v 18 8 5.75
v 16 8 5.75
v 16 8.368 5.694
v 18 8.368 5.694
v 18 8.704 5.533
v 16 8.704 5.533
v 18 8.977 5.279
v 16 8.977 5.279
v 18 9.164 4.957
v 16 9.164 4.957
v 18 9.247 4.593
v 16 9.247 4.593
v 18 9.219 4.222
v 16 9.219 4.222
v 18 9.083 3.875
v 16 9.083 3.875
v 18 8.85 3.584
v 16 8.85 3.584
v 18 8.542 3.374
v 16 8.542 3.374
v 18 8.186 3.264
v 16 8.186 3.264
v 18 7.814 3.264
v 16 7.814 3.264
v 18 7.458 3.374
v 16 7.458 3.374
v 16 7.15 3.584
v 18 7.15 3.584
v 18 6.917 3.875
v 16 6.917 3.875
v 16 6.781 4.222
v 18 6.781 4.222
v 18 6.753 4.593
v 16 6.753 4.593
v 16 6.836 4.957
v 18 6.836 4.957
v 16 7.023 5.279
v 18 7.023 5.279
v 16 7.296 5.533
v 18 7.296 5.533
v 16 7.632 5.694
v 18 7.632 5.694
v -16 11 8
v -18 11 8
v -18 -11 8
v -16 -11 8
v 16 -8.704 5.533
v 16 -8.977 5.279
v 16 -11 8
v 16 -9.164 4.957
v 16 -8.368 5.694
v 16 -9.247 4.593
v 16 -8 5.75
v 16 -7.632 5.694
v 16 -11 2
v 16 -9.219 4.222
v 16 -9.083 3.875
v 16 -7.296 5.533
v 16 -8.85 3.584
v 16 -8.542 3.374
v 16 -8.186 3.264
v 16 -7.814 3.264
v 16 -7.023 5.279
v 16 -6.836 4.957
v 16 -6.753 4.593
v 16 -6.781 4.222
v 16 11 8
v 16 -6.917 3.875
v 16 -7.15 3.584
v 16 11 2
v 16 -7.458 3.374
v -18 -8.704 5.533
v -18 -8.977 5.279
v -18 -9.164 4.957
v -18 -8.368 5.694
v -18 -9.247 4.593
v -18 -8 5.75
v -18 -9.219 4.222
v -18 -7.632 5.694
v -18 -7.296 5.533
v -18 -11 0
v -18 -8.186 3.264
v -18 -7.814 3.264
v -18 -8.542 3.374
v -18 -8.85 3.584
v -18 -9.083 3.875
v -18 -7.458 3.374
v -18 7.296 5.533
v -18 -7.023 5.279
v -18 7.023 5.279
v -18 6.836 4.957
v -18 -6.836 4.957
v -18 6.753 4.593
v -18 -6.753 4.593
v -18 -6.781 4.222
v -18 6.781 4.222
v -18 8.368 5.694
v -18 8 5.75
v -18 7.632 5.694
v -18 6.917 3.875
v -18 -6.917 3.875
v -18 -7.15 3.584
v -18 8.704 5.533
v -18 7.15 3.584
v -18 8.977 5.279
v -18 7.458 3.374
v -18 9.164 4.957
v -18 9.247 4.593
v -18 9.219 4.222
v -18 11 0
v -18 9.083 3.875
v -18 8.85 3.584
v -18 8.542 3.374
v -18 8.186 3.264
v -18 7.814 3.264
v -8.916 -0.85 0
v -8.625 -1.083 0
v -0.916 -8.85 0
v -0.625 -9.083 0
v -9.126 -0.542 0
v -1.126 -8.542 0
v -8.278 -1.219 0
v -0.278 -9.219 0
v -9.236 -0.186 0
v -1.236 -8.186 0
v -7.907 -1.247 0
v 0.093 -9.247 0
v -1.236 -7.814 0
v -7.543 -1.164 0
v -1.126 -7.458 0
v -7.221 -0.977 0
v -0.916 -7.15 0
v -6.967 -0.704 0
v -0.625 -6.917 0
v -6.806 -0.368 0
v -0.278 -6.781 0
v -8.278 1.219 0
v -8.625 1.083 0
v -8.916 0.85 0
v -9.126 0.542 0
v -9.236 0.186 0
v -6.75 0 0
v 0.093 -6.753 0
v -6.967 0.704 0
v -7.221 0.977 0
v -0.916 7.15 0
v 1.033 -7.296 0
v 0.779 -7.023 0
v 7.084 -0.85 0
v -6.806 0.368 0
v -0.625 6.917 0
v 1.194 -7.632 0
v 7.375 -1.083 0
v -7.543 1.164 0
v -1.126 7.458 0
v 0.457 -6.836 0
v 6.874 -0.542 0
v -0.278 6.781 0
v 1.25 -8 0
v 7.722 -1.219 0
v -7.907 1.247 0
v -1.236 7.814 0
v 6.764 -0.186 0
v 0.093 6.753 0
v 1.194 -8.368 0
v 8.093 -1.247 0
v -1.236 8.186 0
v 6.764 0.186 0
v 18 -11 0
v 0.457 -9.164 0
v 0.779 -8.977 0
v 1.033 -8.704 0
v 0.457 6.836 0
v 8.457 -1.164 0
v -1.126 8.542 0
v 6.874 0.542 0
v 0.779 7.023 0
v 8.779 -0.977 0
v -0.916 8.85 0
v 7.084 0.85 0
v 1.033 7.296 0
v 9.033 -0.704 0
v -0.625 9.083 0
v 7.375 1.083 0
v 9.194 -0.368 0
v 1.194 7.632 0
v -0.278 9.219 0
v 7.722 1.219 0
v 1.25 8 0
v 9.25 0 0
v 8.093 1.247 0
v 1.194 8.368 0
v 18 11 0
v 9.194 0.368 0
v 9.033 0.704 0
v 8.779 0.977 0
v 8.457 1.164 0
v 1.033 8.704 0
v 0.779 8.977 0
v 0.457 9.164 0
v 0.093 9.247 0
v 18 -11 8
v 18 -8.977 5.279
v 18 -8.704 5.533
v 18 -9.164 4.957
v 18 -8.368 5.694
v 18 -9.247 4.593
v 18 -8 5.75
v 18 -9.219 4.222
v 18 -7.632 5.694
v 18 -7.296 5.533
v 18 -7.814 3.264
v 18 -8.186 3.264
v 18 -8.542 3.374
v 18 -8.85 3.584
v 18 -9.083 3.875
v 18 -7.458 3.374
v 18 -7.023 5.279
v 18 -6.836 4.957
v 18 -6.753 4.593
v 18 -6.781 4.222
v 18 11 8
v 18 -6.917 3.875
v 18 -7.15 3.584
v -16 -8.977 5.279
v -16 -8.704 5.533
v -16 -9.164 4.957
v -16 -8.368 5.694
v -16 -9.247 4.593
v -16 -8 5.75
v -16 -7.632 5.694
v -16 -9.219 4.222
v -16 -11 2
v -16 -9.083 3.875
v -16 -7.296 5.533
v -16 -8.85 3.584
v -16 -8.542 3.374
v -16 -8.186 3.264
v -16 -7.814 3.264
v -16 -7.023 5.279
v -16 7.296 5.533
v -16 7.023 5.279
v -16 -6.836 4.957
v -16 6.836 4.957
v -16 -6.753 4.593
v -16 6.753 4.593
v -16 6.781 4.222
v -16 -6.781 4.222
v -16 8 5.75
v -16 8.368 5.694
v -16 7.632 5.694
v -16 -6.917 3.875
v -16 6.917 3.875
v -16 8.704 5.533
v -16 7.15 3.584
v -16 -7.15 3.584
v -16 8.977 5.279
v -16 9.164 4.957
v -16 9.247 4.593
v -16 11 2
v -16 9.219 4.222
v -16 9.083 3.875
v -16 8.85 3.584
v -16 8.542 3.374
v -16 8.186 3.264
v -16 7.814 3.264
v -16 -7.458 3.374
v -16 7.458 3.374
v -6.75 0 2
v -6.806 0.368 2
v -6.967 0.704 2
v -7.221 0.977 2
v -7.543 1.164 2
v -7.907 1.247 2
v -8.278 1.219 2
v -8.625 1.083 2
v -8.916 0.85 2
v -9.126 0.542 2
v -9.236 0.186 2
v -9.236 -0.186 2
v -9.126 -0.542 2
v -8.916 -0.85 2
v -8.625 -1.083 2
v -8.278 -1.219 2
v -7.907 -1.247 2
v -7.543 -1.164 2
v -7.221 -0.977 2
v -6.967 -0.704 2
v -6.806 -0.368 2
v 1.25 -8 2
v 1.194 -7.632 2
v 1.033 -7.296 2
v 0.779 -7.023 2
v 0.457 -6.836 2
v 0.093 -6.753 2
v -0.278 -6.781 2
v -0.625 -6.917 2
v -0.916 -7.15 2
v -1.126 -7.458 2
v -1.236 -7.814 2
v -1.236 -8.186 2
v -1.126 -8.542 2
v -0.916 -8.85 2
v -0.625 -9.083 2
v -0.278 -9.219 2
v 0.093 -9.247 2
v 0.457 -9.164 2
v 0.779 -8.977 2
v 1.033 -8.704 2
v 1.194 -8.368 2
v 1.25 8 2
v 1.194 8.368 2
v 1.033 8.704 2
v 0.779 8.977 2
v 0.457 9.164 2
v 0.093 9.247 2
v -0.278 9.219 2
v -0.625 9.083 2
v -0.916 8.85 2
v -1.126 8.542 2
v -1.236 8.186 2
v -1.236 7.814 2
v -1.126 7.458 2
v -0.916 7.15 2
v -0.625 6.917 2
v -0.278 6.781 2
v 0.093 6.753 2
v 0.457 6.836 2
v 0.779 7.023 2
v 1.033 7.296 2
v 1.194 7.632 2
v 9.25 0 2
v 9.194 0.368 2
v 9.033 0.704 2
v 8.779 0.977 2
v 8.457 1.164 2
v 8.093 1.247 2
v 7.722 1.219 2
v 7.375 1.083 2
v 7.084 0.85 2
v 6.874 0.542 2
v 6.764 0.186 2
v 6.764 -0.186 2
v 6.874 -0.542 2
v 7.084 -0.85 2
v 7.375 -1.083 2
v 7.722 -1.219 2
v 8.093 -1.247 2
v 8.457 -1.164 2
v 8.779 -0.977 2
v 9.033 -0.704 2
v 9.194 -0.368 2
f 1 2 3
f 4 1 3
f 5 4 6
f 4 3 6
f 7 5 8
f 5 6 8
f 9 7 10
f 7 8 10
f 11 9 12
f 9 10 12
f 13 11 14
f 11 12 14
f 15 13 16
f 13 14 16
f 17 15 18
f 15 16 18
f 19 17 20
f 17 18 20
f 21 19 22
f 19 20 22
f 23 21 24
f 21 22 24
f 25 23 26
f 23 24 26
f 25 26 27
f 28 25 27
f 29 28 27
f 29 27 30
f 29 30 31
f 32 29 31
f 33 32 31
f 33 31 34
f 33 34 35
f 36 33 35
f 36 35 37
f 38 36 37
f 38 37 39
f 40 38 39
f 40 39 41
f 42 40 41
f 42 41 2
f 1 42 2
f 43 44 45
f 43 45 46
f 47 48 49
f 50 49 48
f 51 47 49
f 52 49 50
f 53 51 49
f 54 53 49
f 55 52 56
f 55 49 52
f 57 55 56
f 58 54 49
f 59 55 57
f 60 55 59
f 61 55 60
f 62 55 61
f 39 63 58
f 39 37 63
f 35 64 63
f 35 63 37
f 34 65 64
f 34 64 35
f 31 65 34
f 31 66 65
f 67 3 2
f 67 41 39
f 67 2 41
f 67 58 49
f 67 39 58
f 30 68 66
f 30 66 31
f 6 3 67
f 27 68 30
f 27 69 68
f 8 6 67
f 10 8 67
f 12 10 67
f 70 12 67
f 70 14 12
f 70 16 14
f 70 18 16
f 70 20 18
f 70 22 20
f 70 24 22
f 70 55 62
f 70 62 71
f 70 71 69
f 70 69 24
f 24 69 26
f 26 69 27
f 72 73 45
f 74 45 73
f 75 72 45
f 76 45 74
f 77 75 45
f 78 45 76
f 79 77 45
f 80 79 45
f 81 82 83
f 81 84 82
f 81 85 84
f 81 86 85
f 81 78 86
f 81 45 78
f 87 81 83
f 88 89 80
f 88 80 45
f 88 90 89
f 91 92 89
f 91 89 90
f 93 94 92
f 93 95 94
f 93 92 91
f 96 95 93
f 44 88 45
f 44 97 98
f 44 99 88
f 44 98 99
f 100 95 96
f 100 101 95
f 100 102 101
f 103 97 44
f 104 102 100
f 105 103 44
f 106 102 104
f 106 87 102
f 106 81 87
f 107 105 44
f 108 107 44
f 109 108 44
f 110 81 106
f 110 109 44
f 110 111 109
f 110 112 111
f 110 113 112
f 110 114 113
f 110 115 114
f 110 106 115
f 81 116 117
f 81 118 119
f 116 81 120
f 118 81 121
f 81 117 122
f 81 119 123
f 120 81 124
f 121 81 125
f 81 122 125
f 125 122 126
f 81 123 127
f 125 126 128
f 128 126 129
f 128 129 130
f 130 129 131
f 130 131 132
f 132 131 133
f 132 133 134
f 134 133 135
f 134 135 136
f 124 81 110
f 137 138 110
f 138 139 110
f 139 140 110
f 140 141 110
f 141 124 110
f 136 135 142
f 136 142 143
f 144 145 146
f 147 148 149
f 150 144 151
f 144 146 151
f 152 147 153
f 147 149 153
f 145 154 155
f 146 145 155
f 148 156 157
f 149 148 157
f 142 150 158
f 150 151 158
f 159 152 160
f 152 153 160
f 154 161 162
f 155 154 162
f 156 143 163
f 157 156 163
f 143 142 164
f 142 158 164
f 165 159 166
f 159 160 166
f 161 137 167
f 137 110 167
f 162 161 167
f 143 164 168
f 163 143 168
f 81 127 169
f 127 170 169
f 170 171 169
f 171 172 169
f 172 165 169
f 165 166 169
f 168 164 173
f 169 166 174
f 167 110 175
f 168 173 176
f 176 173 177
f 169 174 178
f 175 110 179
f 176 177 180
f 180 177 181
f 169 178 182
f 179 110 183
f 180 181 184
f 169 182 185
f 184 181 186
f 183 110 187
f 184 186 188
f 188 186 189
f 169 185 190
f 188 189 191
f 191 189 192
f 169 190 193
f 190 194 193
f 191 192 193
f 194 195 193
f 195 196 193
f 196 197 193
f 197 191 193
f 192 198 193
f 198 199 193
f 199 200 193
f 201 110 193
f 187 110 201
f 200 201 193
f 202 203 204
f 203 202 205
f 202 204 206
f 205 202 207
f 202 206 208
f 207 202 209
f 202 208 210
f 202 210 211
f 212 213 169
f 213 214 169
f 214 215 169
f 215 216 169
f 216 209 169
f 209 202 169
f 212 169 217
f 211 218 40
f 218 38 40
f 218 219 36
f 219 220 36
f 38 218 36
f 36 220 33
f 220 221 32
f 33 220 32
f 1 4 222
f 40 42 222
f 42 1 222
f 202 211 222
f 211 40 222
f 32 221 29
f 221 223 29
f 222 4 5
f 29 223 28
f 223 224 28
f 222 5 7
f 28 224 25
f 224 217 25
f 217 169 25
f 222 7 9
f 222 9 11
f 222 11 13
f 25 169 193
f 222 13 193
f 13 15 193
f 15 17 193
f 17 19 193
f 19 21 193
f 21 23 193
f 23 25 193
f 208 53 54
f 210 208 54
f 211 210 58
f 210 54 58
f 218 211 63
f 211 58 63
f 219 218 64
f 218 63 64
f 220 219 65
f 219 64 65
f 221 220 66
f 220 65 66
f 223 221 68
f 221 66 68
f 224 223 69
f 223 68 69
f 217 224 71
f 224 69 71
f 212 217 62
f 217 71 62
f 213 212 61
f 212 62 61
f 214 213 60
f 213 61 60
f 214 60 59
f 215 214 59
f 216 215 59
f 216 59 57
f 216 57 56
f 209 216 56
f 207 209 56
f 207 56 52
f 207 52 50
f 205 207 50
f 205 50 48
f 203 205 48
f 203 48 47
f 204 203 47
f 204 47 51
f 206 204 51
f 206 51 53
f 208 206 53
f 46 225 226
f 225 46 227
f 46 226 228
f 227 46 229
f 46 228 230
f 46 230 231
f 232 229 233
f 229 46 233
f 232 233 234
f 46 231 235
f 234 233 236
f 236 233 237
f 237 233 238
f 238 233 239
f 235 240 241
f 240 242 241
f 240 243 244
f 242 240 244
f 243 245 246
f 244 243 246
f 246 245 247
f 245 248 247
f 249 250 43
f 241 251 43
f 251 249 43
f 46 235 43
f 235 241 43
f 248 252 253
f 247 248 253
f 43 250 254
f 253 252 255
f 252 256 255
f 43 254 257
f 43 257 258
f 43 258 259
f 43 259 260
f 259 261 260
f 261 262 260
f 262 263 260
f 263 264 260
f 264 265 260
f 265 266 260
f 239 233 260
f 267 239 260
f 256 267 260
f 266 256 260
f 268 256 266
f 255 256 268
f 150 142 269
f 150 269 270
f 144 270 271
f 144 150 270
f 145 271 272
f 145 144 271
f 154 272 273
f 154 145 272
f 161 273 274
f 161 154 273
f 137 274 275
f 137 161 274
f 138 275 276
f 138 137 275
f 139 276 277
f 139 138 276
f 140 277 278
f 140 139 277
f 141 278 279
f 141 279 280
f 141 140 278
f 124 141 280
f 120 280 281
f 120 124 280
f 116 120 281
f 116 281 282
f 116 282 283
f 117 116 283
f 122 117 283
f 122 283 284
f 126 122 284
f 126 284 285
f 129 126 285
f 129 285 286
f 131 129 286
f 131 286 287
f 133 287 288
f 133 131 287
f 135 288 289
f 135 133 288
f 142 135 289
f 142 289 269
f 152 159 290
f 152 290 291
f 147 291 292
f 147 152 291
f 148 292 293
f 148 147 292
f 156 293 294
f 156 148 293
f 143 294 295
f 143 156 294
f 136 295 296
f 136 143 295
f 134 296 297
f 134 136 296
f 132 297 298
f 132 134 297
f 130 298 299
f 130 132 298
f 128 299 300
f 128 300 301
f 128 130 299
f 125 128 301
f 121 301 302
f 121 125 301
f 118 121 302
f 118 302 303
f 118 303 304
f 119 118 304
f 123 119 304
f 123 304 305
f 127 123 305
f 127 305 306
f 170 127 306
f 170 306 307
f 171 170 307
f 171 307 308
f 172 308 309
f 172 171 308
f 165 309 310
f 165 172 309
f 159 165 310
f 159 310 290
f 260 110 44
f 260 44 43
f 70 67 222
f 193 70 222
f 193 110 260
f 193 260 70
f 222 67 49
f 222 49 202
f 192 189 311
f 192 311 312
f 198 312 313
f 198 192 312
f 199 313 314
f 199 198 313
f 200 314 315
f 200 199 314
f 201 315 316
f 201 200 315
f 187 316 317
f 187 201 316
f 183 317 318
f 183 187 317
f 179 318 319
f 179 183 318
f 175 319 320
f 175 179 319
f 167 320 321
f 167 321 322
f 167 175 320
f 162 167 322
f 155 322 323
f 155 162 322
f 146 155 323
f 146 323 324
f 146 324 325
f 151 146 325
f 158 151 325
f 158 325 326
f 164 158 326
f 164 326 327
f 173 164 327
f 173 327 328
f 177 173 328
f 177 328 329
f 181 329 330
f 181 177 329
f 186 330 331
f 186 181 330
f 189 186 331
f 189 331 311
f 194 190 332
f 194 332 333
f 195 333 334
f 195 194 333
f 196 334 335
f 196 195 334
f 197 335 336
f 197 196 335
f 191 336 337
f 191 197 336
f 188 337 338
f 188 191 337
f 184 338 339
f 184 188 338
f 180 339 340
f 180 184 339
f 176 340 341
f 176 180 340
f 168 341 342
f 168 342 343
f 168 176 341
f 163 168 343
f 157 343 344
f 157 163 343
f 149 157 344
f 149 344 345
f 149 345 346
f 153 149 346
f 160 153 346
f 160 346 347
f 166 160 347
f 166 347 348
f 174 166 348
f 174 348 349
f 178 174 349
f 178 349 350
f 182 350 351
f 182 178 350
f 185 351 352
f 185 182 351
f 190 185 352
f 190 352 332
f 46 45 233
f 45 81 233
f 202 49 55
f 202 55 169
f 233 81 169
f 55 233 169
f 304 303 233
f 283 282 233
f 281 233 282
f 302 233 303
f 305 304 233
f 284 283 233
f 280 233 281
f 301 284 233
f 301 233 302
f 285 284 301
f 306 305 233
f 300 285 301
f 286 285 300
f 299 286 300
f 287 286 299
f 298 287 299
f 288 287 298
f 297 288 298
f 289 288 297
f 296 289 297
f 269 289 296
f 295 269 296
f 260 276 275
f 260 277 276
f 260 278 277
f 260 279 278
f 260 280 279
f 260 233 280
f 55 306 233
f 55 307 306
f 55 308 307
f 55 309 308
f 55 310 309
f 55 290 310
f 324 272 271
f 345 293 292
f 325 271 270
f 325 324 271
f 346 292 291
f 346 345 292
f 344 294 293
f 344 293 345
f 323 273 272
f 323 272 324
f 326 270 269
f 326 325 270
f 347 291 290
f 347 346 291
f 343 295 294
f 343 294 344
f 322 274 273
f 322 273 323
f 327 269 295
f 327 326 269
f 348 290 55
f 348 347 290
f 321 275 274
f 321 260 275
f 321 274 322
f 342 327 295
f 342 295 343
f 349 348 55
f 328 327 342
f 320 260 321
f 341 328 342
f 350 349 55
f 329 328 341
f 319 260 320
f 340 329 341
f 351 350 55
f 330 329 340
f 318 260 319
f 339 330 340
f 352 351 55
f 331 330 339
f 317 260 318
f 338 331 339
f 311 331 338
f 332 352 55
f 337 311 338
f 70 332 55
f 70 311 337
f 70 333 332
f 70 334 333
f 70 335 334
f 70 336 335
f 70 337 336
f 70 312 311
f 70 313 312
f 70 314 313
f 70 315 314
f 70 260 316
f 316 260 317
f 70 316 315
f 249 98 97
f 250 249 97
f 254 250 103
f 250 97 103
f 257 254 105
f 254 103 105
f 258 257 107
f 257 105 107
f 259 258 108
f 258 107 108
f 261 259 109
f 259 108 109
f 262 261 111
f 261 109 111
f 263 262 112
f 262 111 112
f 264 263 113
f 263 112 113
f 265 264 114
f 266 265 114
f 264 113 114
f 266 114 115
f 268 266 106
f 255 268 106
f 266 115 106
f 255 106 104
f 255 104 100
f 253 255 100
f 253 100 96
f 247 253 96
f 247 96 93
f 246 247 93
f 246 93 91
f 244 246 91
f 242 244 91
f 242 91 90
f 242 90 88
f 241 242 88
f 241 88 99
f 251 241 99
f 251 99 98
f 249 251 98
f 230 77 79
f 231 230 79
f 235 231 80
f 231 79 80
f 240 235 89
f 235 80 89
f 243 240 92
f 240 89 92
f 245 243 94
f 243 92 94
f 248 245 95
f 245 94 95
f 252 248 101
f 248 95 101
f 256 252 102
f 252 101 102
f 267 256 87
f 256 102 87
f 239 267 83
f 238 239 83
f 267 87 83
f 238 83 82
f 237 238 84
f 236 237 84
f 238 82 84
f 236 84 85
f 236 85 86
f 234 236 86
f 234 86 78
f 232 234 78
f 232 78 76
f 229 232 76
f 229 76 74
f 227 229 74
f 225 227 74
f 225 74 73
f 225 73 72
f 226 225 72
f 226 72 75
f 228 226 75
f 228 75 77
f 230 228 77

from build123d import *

# Parameters (mm, degrees)
ESBO_O1_W                = 36
ESBO_O1_H                = 22
ESBO_O1_R                = 1.25
RESSALTO_EXTRUS_O1_DEPTH = 2
ESBO_O2_W                = 2
ESBO_O2_H                = 22
RESSALTO_EXTRUS_O2_DEPTH = 6
CORTE_EXTRUS_O1_REACH    = 40.484
ESBO_O3_R                = 1.25


with BuildPart() as part:
    # Esboço1 → Ressalto-extrusão1 (new body)
    with BuildSketch(Plane.XY):
        Rectangle(ESBO_O1_W, ESBO_O1_H)
        with Locations((0, 8)):
            Circle(ESBO_O1_R, mode=Mode.SUBTRACT)
        with Locations((8, 0)):
            Circle(ESBO_O1_R, mode=Mode.SUBTRACT)
        with Locations((0, -8)):
            Circle(ESBO_O1_R, mode=Mode.SUBTRACT)
        with Locations((-8, 0)):
            Circle(ESBO_O1_R, mode=Mode.SUBTRACT)
    extrude(amount=RESSALTO_EXTRUS_O1_DEPTH)

    # Esboço2 → Ressalto-extrusão2 (add)
    with BuildSketch(Plane.XY.offset(2)):
        with Locations((-17, 0)):
            Rectangle(ESBO_O2_W, ESBO_O2_H)
        with Locations((17, 0)):
            Rectangle(ESBO_O2_W, ESBO_O2_H)
    extrude(amount=RESSALTO_EXTRUS_O2_DEPTH)

    # Corte-extrusão1: up to this face of the body (flat: up to its plane)
    corte_extrus_o1_end = Plane(part.part.faces().sort_by_distance((18, 0, 4))[0])
    # Esboço3 → Corte-extrusão1 (cut, up to the picked face)
    with BuildSketch(Plane.ZY.offset(18), mode=Mode.PRIVATE) as corte_extrus_o1_sk1:
        with Locations((4.5, 8)):
            Circle(ESBO_O3_R)
    corte_extrus_o1_tool1 = split(extrude(corte_extrus_o1_sk1.sketch, amount=-CORTE_EXTRUS_O1_REACH, mode=Mode.PRIVATE), bisect_by=corte_extrus_o1_end, keep=Keep.BOTH, mode=Mode.PRIVATE)
    # Esboço3 → Corte-extrusão1 (cut, up to the picked face)
    with BuildSketch(Plane.ZY.offset(18), mode=Mode.PRIVATE) as corte_extrus_o1_sk2:
        with Locations((4.5, -8)):
            Circle(ESBO_O3_R)
    corte_extrus_o1_tool2 = split(extrude(corte_extrus_o1_sk2.sketch, amount=-CORTE_EXTRUS_O1_REACH, mode=Mode.PRIVATE), bisect_by=corte_extrus_o1_end, keep=Keep.BOTH, mode=Mode.PRIVATE)
    add(corte_extrus_o1_tool1.solids().sort_by(Axis((-18, 8, 4.5), (1, 0, 0)))[0], mode=Mode.SUBTRACT)
    add(corte_extrus_o1_tool2.solids().sort_by(Axis((-18, -8, 4.5), (1, 0, 0)))[0], mode=Mode.SUBTRACT)


solid = part.part
